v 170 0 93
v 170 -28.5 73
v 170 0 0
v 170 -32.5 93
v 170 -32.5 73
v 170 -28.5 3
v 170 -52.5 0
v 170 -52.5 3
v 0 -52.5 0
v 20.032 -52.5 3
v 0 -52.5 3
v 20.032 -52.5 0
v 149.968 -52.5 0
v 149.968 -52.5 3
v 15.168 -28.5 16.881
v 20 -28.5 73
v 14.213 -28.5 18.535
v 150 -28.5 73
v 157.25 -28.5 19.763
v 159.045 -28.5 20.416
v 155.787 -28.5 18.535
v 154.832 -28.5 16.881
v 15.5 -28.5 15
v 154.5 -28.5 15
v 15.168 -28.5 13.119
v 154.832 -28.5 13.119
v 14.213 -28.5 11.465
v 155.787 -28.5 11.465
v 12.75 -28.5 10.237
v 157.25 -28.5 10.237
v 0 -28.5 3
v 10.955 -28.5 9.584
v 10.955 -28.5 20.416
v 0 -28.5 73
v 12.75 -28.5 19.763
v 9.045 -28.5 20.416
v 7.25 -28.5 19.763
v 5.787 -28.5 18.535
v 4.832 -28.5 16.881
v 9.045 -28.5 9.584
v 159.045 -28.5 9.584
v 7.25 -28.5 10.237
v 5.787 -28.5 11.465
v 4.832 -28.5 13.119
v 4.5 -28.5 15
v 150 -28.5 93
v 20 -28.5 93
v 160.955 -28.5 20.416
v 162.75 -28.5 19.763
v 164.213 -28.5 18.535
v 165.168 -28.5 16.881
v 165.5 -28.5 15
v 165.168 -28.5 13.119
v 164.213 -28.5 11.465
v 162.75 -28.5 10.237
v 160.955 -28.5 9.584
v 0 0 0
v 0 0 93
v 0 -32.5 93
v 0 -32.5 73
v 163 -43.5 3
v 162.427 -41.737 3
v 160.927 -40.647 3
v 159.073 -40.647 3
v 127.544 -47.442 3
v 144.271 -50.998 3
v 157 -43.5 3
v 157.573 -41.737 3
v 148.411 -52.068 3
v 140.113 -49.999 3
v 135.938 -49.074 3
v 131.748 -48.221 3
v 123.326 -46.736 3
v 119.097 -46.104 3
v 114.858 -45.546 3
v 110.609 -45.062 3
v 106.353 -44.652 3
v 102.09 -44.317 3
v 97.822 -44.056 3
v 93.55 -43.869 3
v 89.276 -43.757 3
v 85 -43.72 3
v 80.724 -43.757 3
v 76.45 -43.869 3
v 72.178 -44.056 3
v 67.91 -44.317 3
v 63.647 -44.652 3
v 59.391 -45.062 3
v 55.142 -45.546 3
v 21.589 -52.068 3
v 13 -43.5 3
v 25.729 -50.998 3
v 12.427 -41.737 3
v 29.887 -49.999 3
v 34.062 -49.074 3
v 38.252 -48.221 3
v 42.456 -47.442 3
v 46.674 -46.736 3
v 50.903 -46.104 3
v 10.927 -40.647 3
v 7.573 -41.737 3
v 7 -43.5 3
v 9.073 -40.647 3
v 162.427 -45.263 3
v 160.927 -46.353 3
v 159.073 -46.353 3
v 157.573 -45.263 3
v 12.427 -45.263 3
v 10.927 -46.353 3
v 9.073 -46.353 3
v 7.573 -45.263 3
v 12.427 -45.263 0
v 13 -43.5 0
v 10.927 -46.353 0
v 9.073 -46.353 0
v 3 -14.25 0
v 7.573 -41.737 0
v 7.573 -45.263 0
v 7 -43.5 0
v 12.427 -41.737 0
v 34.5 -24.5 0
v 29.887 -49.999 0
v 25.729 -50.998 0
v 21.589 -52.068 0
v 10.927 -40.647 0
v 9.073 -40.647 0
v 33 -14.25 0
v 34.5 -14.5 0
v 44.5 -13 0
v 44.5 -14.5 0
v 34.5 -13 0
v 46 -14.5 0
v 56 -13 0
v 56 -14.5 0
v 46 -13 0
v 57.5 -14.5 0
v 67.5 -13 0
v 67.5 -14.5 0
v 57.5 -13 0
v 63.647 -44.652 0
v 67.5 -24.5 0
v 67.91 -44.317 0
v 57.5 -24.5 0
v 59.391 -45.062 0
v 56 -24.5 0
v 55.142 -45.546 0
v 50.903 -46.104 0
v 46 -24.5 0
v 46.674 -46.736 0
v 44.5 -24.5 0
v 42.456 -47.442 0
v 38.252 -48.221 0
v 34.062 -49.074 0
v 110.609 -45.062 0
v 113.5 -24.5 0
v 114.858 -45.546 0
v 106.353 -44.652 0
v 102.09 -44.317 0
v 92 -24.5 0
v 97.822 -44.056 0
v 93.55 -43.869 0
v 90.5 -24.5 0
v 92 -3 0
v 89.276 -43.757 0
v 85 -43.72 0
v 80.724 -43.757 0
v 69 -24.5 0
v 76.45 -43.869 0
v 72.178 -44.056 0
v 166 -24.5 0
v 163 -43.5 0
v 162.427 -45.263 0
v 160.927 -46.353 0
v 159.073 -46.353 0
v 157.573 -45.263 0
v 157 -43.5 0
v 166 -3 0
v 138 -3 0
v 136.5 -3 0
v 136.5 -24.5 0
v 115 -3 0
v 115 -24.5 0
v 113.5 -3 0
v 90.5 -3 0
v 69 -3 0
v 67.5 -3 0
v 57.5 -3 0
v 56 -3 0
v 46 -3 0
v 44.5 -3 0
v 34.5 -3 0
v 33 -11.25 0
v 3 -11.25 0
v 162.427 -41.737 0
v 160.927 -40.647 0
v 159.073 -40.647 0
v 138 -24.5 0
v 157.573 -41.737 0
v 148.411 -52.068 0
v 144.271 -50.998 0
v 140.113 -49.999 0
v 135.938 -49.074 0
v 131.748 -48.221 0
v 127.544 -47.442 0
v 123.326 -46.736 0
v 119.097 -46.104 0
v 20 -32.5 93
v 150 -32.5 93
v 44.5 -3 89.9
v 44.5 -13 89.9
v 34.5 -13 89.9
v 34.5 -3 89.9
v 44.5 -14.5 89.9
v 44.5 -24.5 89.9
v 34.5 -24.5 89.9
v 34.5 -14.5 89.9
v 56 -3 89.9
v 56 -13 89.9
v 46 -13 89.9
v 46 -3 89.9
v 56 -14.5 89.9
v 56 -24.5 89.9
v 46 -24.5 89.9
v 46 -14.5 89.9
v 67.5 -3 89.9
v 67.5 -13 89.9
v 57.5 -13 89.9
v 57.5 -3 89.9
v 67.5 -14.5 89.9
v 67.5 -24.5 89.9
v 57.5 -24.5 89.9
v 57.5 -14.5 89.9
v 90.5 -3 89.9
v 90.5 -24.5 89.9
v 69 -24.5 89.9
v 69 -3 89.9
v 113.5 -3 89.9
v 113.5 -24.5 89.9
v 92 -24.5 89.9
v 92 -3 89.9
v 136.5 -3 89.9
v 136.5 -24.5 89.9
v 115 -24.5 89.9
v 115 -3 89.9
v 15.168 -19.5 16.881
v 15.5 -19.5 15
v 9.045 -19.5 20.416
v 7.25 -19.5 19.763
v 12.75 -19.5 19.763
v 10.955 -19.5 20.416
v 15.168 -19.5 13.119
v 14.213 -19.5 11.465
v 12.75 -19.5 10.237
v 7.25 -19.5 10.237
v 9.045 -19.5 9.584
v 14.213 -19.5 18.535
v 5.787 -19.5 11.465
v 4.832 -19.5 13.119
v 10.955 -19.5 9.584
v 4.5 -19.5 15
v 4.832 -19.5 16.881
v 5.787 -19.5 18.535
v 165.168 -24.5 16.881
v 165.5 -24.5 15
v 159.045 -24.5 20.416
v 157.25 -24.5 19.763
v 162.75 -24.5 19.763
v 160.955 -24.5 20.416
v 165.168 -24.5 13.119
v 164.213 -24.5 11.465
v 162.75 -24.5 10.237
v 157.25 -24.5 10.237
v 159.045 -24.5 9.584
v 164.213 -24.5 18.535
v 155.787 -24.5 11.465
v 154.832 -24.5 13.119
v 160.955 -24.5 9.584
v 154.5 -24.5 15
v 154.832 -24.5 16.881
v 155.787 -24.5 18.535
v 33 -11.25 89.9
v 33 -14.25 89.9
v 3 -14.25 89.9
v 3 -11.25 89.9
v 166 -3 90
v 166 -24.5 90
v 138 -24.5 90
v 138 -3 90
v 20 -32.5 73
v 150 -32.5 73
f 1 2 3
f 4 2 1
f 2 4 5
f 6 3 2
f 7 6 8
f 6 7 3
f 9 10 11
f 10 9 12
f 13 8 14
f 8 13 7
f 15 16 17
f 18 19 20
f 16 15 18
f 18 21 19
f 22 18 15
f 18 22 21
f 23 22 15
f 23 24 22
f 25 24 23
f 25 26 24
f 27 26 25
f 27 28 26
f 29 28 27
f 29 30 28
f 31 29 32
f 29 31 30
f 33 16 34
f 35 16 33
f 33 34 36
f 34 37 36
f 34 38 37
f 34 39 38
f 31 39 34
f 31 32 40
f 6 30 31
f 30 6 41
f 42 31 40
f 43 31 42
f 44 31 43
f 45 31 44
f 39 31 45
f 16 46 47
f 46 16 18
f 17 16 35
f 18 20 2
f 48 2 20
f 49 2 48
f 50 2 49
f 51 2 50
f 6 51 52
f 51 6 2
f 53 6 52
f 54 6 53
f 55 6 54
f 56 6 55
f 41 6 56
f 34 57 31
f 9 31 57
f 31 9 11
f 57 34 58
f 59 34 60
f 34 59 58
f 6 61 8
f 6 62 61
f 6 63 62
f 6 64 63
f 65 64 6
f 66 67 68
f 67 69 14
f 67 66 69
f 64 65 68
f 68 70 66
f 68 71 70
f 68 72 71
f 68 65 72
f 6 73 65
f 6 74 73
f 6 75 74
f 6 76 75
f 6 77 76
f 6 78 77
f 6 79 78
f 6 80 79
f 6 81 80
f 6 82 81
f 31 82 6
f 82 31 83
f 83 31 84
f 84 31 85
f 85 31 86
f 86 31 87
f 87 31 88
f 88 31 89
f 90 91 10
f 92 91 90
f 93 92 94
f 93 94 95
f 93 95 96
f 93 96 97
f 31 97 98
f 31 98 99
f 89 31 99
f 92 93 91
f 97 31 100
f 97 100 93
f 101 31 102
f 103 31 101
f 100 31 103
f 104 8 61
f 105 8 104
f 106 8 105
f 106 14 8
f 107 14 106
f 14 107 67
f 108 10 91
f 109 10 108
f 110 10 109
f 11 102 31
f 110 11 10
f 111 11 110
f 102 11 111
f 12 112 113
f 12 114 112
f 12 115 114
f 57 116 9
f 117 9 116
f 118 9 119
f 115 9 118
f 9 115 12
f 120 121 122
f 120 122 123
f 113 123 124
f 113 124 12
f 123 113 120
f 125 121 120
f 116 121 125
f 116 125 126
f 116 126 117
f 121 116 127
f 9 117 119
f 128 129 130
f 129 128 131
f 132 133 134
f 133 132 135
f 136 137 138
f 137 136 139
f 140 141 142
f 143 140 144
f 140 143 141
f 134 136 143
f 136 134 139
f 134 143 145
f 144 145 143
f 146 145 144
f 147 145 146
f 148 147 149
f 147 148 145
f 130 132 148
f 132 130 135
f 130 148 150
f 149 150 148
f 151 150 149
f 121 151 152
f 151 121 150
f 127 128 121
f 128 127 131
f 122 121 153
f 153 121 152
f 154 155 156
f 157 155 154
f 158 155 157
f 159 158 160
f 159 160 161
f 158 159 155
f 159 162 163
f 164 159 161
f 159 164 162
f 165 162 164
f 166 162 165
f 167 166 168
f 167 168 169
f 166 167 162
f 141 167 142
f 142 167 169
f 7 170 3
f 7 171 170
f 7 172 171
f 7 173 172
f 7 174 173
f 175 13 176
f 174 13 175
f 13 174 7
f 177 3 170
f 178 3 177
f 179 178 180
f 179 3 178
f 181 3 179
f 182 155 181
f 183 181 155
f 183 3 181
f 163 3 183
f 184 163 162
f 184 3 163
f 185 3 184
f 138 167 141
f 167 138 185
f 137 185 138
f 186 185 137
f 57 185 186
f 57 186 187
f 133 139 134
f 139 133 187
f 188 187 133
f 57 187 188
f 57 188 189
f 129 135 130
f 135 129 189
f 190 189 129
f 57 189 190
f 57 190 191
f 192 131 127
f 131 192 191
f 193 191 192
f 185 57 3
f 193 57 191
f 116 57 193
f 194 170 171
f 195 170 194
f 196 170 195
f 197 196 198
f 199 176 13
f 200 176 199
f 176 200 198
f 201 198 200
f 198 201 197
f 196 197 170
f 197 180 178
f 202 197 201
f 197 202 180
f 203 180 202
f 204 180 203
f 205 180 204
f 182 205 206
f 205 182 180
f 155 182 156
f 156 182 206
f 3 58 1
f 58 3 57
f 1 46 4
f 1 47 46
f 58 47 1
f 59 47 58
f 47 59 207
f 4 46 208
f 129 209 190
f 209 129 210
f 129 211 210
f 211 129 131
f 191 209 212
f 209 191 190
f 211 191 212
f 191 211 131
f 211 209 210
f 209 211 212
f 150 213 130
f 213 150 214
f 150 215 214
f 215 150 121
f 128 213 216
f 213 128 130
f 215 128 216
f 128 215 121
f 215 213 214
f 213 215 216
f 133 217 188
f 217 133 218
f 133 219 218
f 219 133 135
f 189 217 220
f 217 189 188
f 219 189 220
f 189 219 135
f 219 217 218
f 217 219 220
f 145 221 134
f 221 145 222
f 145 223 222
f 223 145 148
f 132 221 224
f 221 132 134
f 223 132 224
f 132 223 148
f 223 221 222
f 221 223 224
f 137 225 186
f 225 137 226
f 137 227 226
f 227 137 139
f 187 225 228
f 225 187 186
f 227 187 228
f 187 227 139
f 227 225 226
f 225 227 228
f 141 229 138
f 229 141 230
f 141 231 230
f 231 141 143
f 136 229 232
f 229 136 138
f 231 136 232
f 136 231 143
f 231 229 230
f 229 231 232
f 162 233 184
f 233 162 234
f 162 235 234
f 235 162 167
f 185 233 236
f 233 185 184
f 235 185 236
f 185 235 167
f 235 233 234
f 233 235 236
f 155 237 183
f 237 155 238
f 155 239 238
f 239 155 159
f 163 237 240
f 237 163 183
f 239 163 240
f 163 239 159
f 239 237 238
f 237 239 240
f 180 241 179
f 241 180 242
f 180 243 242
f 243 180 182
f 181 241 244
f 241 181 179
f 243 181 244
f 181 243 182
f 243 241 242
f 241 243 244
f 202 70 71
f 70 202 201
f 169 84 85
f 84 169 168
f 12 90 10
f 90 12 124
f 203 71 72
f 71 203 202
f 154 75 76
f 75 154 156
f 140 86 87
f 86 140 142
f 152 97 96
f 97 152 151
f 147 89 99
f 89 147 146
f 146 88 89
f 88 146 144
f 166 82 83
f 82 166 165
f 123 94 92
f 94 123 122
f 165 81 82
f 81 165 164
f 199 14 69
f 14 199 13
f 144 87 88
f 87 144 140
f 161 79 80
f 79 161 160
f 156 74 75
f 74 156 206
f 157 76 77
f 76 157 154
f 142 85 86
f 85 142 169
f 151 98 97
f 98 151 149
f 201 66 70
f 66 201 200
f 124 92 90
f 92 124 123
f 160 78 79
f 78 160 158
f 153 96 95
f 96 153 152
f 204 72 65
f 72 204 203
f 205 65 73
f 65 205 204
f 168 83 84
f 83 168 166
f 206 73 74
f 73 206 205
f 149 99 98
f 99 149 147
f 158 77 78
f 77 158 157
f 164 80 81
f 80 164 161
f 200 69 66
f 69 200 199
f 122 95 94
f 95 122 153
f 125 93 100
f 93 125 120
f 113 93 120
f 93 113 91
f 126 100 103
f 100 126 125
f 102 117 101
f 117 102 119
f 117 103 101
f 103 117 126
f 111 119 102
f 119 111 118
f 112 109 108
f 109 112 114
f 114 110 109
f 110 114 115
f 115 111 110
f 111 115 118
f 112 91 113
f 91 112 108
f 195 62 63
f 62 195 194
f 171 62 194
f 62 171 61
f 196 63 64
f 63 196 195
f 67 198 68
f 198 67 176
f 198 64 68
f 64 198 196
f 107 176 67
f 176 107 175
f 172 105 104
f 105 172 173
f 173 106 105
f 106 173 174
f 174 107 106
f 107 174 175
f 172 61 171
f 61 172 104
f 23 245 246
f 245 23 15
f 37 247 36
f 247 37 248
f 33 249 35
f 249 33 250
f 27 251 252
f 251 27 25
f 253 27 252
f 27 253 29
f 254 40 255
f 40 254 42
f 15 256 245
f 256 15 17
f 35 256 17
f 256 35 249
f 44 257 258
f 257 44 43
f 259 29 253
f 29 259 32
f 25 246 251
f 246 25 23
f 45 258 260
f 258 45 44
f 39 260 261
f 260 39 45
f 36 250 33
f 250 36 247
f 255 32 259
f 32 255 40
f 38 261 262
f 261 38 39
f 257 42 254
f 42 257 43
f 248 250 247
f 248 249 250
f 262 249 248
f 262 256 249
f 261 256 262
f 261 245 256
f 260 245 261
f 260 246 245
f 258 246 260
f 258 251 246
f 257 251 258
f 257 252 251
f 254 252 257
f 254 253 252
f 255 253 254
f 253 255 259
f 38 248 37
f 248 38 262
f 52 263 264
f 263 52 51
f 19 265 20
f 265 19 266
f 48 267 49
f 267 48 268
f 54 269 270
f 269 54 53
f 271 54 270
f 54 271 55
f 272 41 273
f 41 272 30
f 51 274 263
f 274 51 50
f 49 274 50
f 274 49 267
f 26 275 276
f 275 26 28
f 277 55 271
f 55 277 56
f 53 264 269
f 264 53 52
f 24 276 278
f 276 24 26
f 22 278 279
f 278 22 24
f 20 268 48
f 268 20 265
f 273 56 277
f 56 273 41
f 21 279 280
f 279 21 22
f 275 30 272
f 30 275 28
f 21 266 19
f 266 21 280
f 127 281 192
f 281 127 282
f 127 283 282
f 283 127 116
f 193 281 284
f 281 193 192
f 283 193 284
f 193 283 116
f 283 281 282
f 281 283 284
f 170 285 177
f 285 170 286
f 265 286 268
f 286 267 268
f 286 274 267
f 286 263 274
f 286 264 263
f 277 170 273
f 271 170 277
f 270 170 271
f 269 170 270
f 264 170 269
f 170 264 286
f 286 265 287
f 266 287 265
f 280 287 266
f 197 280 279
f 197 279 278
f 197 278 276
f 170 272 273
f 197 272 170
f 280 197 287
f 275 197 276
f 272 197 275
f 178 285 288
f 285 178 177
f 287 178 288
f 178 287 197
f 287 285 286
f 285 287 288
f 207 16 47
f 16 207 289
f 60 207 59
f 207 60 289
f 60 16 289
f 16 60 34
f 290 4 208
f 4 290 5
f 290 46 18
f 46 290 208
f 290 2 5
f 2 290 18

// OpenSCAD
//Height
h=90; //[10:250]

//Knife compartments?
knife=1; //[yes=1, no=0]

//Number of small (10x10mm) compartments
small=6; //[0:28]

//Number of big (20x20mm) compartments
big=3; //[0:11]


/* [Hidden] */
//Thilness of the box. Do not modifie this now, may be use in future release.
e=28.5; //[26.5]


rotate([90,0,0])union()
{
	difference()
	{
		union()
		{
			translate([0,0,e])cube([170,3,24]);
			cube([170,h+3,e]);
		}
		translate([170/2,-0.1,288.72])rotate([-90,0,0])cylinder(r=245,h=3.2,$fs=0.1,$fa=1);
		translate([10,-0.1,43.5])rotate([-90,0,0])cylinder(r=3,h=3.2);
		translate([160,-0.1,43.5])rotate([-90,0,0])cylinder(r=3,h=3.2);
		translate([10,15,e-9])cylinder(r=11/2, h=10.1);
		translate([10,15,e-7])cylinder(r=11/2, h=7.1);
		translate([160,15,e-7])cylinder(r=11/2, h=7.1);
		if(knife)
		{
			translate([3,-0.2,11.25])cube([30,h+0.1,3]);
		}
	

		if(small!=0)for (i = [0:small/2-1])
		{
			translate([3+knife*31.5+i*11.5, -0.2,3])cube([10,h+0.1,10]);
			translate([3+knife*31.5+i*11.5, -0.2,14.5])cube([10,h+0.1,10]);
		}

		if(big!=0)for(i=[small/2:small/2+big-1])
		{
			translate([3+knife*31.5+(small/2)*11.5+(i-small/2)*23, -0.2,3])cube([21.5,h+0.1,21.5]);
		}
	
		translate([3+knife*31.5+(small/2)*11.5+(small/2+big-small/2)*23, -0.1,3])cube([168-(3+knife*31.5+(small/2)*11.5+(small/2+big-small/2)*23)-2,h+0.1,21.5]);
	}
	translate([0,h+3-20,e])cube([20,20,4]);
	translate([170-20,h+3-20,e])cube([20,20,4]);
}
